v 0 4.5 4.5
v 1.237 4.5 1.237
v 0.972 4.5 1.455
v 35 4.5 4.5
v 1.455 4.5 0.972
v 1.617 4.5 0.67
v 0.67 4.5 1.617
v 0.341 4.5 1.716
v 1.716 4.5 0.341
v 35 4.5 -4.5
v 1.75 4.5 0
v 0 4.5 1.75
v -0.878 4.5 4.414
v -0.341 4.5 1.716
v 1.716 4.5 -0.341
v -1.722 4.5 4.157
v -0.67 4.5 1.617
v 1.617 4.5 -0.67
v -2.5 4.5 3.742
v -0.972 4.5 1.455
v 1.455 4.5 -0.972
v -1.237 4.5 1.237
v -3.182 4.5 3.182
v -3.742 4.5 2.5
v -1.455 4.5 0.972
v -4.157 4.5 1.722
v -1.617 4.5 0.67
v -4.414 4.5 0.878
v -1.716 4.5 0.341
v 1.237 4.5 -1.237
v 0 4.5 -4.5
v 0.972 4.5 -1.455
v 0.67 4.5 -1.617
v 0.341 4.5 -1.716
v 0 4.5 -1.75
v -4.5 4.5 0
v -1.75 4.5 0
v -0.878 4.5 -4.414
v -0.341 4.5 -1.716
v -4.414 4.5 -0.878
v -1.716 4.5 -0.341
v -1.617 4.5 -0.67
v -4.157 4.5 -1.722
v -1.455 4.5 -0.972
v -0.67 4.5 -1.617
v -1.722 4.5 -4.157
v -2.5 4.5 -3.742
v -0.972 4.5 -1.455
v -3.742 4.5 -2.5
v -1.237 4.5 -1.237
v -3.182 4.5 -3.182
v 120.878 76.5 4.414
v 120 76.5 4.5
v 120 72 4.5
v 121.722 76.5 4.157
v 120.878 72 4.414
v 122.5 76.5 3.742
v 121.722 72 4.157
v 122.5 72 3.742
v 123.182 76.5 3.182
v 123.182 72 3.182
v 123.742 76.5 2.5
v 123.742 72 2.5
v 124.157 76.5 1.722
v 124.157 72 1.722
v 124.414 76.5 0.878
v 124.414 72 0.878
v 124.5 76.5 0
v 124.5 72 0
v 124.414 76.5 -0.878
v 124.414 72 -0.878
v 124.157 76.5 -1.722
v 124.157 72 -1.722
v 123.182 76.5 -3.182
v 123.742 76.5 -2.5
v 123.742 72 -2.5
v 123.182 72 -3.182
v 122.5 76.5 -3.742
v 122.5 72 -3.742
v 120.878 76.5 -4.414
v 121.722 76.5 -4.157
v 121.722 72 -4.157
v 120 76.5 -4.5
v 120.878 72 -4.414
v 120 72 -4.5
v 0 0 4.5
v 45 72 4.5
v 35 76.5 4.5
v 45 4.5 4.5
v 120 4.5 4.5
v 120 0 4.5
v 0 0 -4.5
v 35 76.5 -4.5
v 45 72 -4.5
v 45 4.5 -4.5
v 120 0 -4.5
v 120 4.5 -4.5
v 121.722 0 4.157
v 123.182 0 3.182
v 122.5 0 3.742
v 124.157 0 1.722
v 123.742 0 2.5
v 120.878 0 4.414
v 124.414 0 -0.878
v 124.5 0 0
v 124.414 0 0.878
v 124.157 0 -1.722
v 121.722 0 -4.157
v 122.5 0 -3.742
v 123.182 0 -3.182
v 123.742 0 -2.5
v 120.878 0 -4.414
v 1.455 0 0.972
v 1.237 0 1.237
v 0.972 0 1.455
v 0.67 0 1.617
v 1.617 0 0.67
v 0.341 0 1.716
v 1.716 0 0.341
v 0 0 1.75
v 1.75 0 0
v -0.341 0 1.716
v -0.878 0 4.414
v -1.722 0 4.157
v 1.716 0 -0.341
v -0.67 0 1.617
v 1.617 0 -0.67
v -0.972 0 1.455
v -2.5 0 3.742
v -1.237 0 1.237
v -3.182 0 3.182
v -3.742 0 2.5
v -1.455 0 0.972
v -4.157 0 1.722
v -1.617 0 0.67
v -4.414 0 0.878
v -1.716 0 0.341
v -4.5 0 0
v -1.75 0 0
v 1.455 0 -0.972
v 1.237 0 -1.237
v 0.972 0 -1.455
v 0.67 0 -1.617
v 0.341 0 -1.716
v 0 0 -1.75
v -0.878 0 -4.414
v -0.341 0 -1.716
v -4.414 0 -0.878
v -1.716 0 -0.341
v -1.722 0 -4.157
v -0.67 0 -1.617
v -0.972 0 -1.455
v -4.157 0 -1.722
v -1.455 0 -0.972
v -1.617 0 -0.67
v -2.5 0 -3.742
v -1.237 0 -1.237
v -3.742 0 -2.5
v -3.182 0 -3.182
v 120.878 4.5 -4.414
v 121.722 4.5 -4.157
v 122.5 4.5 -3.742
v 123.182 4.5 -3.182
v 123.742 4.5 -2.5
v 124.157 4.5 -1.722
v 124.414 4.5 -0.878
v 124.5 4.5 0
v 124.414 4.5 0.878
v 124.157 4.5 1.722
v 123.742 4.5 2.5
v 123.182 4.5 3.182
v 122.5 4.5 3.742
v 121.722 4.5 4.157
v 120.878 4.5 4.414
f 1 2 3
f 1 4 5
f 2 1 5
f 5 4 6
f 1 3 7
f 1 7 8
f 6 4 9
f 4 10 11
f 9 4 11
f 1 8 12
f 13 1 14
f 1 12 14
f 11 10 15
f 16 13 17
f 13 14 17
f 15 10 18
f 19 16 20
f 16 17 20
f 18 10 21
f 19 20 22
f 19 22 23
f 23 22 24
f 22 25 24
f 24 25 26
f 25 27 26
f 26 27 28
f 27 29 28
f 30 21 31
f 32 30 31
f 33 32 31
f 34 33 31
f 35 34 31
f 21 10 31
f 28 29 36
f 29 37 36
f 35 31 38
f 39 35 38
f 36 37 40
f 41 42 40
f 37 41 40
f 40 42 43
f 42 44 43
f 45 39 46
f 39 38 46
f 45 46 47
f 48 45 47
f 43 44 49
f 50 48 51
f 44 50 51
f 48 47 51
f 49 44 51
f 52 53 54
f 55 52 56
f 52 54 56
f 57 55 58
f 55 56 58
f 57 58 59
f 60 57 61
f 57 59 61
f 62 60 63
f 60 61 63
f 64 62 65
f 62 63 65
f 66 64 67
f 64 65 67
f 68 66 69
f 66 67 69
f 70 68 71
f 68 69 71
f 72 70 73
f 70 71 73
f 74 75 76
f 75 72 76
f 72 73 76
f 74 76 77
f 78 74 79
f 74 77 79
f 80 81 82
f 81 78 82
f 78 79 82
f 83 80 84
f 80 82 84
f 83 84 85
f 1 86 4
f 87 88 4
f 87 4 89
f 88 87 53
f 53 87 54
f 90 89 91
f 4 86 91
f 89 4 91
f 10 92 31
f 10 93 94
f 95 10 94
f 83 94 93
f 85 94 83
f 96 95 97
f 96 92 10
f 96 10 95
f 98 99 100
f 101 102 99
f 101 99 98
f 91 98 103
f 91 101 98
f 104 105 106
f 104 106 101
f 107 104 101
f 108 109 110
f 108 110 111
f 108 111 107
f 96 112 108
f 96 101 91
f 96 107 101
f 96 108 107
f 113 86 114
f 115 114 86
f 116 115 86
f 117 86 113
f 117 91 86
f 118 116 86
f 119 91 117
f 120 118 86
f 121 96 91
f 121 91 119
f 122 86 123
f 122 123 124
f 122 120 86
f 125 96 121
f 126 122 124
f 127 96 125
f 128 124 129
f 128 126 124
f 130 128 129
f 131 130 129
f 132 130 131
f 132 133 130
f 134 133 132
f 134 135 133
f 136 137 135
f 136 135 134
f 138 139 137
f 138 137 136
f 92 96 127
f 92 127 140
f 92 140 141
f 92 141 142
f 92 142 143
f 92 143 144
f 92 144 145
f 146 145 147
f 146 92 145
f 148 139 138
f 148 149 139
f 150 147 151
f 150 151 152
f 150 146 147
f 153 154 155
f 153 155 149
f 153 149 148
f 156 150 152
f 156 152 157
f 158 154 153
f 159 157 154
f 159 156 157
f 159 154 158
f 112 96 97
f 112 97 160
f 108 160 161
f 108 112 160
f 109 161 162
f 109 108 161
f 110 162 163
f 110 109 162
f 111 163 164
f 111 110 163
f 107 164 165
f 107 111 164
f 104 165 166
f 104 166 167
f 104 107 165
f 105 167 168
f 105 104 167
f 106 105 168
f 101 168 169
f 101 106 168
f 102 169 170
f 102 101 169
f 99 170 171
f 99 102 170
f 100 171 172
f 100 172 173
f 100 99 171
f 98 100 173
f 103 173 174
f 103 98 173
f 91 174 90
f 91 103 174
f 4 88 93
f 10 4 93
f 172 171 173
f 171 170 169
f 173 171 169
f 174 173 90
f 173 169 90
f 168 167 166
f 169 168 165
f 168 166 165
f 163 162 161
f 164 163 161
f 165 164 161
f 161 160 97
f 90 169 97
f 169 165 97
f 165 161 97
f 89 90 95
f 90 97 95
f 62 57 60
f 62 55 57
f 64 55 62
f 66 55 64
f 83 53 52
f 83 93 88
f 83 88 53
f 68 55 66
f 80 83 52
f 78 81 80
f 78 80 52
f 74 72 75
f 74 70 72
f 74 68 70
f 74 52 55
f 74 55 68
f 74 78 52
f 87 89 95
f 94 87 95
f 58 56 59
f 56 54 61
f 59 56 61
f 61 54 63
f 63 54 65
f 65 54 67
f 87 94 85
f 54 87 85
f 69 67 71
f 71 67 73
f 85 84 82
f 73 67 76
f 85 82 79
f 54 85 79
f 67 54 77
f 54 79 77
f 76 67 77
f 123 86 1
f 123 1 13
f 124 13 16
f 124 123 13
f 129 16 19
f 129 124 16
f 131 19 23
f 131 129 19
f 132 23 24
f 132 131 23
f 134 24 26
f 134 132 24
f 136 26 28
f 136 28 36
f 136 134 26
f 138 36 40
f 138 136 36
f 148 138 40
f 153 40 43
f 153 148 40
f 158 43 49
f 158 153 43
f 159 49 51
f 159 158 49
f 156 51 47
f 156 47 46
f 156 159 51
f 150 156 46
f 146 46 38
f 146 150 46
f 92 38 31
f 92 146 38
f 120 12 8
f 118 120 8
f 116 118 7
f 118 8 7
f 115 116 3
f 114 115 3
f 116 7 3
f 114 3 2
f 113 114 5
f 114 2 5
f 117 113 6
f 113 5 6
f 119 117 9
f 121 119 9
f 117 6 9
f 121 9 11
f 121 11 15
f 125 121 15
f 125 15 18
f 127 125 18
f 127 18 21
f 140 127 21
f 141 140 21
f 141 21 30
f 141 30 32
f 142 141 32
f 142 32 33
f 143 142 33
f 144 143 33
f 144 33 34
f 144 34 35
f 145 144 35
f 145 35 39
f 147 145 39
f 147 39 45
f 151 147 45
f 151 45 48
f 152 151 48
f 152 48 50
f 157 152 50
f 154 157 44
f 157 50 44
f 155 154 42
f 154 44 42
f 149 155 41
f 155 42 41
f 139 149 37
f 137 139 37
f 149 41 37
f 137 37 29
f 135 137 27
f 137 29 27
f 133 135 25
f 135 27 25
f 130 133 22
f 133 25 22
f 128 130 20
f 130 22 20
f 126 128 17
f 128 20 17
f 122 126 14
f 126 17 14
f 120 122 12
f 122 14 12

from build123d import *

# Parameters (mm, degrees)
BOSS_EXTRUDE1_DEPTH = 4.5
SKETCH2_R           = 1.75
CUT_EXTRUDE1_DEPTH  = 10
SKETCH3_W           = 10
SKETCH3_H           = 9
BOSS_EXTRUDE2_DEPTH = 67.5
SKETCH4_W           = 85
SKETCH4_H           = 9
BOSS_EXTRUDE3_DEPTH = 4.5
BOSS_EXTRUDE4_START = -4.5
SKETCH5_R           = 4.5
BOSS_EXTRUDE4_DEPTH = 4.5


with BuildPart() as part:
    # Sketch1 → Boss-Extrude1 (new body)
    with BuildSketch(Plane(origin=(0, 0, 0), x_dir=(1, 0, 0), z_dir=(0, 1, 0))):
        with BuildLine():
            Line((0, 4.5), (120, 4.5))
            ThreePointArc((120, 4.5), (124.5, 0), (120, -4.5))
            Line((120, -4.5), (0, -4.5))
            ThreePointArc((0, -4.5), (-4.5, 0), (0, 4.5))
        make_face()
    extrude(amount=BOSS_EXTRUDE1_DEPTH)

    # Sketch2 → Cut-Extrude1 (cut)
    with BuildSketch(Plane(origin=(0, 4.5, 0), x_dir=(1, 0, 0), z_dir=(0, 1, 0))):
        with Locations(Location((0, 0, 0), (0, 0, 270))):
            Circle(SKETCH2_R)
    extrude(amount=-CUT_EXTRUDE1_DEPTH, mode=Mode.SUBTRACT)

    # Sketch3 → Boss-Extrude2 (add)
    with BuildSketch(Plane(origin=(0, 4.5, 0), x_dir=(1, 0, 0), z_dir=(0, 1, 0))):
        with Locations((40, 0)):
            Rectangle(SKETCH3_W, SKETCH3_H)
    extrude(amount=BOSS_EXTRUDE2_DEPTH)

    # Sketch4 → Boss-Extrude3 (add)
    with BuildSketch(Plane(origin=(0, 72, 0), x_dir=(1, 0, 0), z_dir=(0, 1, 0))):
        with Locations((77.5, 0)):
            Rectangle(SKETCH4_W, SKETCH4_H)
    extrude(amount=BOSS_EXTRUDE3_DEPTH)

    # Sketch5 → Boss-Extrude4 (add)
    with BuildSketch(Plane(origin=(0, 76.5, 0), x_dir=(1, 0, 0), z_dir=(0, 1, 0)).offset(BOSS_EXTRUDE4_START)):
        with Locations((120, 0)):
            Circle(SKETCH5_R)
    extrude(amount=BOSS_EXTRUDE4_DEPTH)


solid = part.part
